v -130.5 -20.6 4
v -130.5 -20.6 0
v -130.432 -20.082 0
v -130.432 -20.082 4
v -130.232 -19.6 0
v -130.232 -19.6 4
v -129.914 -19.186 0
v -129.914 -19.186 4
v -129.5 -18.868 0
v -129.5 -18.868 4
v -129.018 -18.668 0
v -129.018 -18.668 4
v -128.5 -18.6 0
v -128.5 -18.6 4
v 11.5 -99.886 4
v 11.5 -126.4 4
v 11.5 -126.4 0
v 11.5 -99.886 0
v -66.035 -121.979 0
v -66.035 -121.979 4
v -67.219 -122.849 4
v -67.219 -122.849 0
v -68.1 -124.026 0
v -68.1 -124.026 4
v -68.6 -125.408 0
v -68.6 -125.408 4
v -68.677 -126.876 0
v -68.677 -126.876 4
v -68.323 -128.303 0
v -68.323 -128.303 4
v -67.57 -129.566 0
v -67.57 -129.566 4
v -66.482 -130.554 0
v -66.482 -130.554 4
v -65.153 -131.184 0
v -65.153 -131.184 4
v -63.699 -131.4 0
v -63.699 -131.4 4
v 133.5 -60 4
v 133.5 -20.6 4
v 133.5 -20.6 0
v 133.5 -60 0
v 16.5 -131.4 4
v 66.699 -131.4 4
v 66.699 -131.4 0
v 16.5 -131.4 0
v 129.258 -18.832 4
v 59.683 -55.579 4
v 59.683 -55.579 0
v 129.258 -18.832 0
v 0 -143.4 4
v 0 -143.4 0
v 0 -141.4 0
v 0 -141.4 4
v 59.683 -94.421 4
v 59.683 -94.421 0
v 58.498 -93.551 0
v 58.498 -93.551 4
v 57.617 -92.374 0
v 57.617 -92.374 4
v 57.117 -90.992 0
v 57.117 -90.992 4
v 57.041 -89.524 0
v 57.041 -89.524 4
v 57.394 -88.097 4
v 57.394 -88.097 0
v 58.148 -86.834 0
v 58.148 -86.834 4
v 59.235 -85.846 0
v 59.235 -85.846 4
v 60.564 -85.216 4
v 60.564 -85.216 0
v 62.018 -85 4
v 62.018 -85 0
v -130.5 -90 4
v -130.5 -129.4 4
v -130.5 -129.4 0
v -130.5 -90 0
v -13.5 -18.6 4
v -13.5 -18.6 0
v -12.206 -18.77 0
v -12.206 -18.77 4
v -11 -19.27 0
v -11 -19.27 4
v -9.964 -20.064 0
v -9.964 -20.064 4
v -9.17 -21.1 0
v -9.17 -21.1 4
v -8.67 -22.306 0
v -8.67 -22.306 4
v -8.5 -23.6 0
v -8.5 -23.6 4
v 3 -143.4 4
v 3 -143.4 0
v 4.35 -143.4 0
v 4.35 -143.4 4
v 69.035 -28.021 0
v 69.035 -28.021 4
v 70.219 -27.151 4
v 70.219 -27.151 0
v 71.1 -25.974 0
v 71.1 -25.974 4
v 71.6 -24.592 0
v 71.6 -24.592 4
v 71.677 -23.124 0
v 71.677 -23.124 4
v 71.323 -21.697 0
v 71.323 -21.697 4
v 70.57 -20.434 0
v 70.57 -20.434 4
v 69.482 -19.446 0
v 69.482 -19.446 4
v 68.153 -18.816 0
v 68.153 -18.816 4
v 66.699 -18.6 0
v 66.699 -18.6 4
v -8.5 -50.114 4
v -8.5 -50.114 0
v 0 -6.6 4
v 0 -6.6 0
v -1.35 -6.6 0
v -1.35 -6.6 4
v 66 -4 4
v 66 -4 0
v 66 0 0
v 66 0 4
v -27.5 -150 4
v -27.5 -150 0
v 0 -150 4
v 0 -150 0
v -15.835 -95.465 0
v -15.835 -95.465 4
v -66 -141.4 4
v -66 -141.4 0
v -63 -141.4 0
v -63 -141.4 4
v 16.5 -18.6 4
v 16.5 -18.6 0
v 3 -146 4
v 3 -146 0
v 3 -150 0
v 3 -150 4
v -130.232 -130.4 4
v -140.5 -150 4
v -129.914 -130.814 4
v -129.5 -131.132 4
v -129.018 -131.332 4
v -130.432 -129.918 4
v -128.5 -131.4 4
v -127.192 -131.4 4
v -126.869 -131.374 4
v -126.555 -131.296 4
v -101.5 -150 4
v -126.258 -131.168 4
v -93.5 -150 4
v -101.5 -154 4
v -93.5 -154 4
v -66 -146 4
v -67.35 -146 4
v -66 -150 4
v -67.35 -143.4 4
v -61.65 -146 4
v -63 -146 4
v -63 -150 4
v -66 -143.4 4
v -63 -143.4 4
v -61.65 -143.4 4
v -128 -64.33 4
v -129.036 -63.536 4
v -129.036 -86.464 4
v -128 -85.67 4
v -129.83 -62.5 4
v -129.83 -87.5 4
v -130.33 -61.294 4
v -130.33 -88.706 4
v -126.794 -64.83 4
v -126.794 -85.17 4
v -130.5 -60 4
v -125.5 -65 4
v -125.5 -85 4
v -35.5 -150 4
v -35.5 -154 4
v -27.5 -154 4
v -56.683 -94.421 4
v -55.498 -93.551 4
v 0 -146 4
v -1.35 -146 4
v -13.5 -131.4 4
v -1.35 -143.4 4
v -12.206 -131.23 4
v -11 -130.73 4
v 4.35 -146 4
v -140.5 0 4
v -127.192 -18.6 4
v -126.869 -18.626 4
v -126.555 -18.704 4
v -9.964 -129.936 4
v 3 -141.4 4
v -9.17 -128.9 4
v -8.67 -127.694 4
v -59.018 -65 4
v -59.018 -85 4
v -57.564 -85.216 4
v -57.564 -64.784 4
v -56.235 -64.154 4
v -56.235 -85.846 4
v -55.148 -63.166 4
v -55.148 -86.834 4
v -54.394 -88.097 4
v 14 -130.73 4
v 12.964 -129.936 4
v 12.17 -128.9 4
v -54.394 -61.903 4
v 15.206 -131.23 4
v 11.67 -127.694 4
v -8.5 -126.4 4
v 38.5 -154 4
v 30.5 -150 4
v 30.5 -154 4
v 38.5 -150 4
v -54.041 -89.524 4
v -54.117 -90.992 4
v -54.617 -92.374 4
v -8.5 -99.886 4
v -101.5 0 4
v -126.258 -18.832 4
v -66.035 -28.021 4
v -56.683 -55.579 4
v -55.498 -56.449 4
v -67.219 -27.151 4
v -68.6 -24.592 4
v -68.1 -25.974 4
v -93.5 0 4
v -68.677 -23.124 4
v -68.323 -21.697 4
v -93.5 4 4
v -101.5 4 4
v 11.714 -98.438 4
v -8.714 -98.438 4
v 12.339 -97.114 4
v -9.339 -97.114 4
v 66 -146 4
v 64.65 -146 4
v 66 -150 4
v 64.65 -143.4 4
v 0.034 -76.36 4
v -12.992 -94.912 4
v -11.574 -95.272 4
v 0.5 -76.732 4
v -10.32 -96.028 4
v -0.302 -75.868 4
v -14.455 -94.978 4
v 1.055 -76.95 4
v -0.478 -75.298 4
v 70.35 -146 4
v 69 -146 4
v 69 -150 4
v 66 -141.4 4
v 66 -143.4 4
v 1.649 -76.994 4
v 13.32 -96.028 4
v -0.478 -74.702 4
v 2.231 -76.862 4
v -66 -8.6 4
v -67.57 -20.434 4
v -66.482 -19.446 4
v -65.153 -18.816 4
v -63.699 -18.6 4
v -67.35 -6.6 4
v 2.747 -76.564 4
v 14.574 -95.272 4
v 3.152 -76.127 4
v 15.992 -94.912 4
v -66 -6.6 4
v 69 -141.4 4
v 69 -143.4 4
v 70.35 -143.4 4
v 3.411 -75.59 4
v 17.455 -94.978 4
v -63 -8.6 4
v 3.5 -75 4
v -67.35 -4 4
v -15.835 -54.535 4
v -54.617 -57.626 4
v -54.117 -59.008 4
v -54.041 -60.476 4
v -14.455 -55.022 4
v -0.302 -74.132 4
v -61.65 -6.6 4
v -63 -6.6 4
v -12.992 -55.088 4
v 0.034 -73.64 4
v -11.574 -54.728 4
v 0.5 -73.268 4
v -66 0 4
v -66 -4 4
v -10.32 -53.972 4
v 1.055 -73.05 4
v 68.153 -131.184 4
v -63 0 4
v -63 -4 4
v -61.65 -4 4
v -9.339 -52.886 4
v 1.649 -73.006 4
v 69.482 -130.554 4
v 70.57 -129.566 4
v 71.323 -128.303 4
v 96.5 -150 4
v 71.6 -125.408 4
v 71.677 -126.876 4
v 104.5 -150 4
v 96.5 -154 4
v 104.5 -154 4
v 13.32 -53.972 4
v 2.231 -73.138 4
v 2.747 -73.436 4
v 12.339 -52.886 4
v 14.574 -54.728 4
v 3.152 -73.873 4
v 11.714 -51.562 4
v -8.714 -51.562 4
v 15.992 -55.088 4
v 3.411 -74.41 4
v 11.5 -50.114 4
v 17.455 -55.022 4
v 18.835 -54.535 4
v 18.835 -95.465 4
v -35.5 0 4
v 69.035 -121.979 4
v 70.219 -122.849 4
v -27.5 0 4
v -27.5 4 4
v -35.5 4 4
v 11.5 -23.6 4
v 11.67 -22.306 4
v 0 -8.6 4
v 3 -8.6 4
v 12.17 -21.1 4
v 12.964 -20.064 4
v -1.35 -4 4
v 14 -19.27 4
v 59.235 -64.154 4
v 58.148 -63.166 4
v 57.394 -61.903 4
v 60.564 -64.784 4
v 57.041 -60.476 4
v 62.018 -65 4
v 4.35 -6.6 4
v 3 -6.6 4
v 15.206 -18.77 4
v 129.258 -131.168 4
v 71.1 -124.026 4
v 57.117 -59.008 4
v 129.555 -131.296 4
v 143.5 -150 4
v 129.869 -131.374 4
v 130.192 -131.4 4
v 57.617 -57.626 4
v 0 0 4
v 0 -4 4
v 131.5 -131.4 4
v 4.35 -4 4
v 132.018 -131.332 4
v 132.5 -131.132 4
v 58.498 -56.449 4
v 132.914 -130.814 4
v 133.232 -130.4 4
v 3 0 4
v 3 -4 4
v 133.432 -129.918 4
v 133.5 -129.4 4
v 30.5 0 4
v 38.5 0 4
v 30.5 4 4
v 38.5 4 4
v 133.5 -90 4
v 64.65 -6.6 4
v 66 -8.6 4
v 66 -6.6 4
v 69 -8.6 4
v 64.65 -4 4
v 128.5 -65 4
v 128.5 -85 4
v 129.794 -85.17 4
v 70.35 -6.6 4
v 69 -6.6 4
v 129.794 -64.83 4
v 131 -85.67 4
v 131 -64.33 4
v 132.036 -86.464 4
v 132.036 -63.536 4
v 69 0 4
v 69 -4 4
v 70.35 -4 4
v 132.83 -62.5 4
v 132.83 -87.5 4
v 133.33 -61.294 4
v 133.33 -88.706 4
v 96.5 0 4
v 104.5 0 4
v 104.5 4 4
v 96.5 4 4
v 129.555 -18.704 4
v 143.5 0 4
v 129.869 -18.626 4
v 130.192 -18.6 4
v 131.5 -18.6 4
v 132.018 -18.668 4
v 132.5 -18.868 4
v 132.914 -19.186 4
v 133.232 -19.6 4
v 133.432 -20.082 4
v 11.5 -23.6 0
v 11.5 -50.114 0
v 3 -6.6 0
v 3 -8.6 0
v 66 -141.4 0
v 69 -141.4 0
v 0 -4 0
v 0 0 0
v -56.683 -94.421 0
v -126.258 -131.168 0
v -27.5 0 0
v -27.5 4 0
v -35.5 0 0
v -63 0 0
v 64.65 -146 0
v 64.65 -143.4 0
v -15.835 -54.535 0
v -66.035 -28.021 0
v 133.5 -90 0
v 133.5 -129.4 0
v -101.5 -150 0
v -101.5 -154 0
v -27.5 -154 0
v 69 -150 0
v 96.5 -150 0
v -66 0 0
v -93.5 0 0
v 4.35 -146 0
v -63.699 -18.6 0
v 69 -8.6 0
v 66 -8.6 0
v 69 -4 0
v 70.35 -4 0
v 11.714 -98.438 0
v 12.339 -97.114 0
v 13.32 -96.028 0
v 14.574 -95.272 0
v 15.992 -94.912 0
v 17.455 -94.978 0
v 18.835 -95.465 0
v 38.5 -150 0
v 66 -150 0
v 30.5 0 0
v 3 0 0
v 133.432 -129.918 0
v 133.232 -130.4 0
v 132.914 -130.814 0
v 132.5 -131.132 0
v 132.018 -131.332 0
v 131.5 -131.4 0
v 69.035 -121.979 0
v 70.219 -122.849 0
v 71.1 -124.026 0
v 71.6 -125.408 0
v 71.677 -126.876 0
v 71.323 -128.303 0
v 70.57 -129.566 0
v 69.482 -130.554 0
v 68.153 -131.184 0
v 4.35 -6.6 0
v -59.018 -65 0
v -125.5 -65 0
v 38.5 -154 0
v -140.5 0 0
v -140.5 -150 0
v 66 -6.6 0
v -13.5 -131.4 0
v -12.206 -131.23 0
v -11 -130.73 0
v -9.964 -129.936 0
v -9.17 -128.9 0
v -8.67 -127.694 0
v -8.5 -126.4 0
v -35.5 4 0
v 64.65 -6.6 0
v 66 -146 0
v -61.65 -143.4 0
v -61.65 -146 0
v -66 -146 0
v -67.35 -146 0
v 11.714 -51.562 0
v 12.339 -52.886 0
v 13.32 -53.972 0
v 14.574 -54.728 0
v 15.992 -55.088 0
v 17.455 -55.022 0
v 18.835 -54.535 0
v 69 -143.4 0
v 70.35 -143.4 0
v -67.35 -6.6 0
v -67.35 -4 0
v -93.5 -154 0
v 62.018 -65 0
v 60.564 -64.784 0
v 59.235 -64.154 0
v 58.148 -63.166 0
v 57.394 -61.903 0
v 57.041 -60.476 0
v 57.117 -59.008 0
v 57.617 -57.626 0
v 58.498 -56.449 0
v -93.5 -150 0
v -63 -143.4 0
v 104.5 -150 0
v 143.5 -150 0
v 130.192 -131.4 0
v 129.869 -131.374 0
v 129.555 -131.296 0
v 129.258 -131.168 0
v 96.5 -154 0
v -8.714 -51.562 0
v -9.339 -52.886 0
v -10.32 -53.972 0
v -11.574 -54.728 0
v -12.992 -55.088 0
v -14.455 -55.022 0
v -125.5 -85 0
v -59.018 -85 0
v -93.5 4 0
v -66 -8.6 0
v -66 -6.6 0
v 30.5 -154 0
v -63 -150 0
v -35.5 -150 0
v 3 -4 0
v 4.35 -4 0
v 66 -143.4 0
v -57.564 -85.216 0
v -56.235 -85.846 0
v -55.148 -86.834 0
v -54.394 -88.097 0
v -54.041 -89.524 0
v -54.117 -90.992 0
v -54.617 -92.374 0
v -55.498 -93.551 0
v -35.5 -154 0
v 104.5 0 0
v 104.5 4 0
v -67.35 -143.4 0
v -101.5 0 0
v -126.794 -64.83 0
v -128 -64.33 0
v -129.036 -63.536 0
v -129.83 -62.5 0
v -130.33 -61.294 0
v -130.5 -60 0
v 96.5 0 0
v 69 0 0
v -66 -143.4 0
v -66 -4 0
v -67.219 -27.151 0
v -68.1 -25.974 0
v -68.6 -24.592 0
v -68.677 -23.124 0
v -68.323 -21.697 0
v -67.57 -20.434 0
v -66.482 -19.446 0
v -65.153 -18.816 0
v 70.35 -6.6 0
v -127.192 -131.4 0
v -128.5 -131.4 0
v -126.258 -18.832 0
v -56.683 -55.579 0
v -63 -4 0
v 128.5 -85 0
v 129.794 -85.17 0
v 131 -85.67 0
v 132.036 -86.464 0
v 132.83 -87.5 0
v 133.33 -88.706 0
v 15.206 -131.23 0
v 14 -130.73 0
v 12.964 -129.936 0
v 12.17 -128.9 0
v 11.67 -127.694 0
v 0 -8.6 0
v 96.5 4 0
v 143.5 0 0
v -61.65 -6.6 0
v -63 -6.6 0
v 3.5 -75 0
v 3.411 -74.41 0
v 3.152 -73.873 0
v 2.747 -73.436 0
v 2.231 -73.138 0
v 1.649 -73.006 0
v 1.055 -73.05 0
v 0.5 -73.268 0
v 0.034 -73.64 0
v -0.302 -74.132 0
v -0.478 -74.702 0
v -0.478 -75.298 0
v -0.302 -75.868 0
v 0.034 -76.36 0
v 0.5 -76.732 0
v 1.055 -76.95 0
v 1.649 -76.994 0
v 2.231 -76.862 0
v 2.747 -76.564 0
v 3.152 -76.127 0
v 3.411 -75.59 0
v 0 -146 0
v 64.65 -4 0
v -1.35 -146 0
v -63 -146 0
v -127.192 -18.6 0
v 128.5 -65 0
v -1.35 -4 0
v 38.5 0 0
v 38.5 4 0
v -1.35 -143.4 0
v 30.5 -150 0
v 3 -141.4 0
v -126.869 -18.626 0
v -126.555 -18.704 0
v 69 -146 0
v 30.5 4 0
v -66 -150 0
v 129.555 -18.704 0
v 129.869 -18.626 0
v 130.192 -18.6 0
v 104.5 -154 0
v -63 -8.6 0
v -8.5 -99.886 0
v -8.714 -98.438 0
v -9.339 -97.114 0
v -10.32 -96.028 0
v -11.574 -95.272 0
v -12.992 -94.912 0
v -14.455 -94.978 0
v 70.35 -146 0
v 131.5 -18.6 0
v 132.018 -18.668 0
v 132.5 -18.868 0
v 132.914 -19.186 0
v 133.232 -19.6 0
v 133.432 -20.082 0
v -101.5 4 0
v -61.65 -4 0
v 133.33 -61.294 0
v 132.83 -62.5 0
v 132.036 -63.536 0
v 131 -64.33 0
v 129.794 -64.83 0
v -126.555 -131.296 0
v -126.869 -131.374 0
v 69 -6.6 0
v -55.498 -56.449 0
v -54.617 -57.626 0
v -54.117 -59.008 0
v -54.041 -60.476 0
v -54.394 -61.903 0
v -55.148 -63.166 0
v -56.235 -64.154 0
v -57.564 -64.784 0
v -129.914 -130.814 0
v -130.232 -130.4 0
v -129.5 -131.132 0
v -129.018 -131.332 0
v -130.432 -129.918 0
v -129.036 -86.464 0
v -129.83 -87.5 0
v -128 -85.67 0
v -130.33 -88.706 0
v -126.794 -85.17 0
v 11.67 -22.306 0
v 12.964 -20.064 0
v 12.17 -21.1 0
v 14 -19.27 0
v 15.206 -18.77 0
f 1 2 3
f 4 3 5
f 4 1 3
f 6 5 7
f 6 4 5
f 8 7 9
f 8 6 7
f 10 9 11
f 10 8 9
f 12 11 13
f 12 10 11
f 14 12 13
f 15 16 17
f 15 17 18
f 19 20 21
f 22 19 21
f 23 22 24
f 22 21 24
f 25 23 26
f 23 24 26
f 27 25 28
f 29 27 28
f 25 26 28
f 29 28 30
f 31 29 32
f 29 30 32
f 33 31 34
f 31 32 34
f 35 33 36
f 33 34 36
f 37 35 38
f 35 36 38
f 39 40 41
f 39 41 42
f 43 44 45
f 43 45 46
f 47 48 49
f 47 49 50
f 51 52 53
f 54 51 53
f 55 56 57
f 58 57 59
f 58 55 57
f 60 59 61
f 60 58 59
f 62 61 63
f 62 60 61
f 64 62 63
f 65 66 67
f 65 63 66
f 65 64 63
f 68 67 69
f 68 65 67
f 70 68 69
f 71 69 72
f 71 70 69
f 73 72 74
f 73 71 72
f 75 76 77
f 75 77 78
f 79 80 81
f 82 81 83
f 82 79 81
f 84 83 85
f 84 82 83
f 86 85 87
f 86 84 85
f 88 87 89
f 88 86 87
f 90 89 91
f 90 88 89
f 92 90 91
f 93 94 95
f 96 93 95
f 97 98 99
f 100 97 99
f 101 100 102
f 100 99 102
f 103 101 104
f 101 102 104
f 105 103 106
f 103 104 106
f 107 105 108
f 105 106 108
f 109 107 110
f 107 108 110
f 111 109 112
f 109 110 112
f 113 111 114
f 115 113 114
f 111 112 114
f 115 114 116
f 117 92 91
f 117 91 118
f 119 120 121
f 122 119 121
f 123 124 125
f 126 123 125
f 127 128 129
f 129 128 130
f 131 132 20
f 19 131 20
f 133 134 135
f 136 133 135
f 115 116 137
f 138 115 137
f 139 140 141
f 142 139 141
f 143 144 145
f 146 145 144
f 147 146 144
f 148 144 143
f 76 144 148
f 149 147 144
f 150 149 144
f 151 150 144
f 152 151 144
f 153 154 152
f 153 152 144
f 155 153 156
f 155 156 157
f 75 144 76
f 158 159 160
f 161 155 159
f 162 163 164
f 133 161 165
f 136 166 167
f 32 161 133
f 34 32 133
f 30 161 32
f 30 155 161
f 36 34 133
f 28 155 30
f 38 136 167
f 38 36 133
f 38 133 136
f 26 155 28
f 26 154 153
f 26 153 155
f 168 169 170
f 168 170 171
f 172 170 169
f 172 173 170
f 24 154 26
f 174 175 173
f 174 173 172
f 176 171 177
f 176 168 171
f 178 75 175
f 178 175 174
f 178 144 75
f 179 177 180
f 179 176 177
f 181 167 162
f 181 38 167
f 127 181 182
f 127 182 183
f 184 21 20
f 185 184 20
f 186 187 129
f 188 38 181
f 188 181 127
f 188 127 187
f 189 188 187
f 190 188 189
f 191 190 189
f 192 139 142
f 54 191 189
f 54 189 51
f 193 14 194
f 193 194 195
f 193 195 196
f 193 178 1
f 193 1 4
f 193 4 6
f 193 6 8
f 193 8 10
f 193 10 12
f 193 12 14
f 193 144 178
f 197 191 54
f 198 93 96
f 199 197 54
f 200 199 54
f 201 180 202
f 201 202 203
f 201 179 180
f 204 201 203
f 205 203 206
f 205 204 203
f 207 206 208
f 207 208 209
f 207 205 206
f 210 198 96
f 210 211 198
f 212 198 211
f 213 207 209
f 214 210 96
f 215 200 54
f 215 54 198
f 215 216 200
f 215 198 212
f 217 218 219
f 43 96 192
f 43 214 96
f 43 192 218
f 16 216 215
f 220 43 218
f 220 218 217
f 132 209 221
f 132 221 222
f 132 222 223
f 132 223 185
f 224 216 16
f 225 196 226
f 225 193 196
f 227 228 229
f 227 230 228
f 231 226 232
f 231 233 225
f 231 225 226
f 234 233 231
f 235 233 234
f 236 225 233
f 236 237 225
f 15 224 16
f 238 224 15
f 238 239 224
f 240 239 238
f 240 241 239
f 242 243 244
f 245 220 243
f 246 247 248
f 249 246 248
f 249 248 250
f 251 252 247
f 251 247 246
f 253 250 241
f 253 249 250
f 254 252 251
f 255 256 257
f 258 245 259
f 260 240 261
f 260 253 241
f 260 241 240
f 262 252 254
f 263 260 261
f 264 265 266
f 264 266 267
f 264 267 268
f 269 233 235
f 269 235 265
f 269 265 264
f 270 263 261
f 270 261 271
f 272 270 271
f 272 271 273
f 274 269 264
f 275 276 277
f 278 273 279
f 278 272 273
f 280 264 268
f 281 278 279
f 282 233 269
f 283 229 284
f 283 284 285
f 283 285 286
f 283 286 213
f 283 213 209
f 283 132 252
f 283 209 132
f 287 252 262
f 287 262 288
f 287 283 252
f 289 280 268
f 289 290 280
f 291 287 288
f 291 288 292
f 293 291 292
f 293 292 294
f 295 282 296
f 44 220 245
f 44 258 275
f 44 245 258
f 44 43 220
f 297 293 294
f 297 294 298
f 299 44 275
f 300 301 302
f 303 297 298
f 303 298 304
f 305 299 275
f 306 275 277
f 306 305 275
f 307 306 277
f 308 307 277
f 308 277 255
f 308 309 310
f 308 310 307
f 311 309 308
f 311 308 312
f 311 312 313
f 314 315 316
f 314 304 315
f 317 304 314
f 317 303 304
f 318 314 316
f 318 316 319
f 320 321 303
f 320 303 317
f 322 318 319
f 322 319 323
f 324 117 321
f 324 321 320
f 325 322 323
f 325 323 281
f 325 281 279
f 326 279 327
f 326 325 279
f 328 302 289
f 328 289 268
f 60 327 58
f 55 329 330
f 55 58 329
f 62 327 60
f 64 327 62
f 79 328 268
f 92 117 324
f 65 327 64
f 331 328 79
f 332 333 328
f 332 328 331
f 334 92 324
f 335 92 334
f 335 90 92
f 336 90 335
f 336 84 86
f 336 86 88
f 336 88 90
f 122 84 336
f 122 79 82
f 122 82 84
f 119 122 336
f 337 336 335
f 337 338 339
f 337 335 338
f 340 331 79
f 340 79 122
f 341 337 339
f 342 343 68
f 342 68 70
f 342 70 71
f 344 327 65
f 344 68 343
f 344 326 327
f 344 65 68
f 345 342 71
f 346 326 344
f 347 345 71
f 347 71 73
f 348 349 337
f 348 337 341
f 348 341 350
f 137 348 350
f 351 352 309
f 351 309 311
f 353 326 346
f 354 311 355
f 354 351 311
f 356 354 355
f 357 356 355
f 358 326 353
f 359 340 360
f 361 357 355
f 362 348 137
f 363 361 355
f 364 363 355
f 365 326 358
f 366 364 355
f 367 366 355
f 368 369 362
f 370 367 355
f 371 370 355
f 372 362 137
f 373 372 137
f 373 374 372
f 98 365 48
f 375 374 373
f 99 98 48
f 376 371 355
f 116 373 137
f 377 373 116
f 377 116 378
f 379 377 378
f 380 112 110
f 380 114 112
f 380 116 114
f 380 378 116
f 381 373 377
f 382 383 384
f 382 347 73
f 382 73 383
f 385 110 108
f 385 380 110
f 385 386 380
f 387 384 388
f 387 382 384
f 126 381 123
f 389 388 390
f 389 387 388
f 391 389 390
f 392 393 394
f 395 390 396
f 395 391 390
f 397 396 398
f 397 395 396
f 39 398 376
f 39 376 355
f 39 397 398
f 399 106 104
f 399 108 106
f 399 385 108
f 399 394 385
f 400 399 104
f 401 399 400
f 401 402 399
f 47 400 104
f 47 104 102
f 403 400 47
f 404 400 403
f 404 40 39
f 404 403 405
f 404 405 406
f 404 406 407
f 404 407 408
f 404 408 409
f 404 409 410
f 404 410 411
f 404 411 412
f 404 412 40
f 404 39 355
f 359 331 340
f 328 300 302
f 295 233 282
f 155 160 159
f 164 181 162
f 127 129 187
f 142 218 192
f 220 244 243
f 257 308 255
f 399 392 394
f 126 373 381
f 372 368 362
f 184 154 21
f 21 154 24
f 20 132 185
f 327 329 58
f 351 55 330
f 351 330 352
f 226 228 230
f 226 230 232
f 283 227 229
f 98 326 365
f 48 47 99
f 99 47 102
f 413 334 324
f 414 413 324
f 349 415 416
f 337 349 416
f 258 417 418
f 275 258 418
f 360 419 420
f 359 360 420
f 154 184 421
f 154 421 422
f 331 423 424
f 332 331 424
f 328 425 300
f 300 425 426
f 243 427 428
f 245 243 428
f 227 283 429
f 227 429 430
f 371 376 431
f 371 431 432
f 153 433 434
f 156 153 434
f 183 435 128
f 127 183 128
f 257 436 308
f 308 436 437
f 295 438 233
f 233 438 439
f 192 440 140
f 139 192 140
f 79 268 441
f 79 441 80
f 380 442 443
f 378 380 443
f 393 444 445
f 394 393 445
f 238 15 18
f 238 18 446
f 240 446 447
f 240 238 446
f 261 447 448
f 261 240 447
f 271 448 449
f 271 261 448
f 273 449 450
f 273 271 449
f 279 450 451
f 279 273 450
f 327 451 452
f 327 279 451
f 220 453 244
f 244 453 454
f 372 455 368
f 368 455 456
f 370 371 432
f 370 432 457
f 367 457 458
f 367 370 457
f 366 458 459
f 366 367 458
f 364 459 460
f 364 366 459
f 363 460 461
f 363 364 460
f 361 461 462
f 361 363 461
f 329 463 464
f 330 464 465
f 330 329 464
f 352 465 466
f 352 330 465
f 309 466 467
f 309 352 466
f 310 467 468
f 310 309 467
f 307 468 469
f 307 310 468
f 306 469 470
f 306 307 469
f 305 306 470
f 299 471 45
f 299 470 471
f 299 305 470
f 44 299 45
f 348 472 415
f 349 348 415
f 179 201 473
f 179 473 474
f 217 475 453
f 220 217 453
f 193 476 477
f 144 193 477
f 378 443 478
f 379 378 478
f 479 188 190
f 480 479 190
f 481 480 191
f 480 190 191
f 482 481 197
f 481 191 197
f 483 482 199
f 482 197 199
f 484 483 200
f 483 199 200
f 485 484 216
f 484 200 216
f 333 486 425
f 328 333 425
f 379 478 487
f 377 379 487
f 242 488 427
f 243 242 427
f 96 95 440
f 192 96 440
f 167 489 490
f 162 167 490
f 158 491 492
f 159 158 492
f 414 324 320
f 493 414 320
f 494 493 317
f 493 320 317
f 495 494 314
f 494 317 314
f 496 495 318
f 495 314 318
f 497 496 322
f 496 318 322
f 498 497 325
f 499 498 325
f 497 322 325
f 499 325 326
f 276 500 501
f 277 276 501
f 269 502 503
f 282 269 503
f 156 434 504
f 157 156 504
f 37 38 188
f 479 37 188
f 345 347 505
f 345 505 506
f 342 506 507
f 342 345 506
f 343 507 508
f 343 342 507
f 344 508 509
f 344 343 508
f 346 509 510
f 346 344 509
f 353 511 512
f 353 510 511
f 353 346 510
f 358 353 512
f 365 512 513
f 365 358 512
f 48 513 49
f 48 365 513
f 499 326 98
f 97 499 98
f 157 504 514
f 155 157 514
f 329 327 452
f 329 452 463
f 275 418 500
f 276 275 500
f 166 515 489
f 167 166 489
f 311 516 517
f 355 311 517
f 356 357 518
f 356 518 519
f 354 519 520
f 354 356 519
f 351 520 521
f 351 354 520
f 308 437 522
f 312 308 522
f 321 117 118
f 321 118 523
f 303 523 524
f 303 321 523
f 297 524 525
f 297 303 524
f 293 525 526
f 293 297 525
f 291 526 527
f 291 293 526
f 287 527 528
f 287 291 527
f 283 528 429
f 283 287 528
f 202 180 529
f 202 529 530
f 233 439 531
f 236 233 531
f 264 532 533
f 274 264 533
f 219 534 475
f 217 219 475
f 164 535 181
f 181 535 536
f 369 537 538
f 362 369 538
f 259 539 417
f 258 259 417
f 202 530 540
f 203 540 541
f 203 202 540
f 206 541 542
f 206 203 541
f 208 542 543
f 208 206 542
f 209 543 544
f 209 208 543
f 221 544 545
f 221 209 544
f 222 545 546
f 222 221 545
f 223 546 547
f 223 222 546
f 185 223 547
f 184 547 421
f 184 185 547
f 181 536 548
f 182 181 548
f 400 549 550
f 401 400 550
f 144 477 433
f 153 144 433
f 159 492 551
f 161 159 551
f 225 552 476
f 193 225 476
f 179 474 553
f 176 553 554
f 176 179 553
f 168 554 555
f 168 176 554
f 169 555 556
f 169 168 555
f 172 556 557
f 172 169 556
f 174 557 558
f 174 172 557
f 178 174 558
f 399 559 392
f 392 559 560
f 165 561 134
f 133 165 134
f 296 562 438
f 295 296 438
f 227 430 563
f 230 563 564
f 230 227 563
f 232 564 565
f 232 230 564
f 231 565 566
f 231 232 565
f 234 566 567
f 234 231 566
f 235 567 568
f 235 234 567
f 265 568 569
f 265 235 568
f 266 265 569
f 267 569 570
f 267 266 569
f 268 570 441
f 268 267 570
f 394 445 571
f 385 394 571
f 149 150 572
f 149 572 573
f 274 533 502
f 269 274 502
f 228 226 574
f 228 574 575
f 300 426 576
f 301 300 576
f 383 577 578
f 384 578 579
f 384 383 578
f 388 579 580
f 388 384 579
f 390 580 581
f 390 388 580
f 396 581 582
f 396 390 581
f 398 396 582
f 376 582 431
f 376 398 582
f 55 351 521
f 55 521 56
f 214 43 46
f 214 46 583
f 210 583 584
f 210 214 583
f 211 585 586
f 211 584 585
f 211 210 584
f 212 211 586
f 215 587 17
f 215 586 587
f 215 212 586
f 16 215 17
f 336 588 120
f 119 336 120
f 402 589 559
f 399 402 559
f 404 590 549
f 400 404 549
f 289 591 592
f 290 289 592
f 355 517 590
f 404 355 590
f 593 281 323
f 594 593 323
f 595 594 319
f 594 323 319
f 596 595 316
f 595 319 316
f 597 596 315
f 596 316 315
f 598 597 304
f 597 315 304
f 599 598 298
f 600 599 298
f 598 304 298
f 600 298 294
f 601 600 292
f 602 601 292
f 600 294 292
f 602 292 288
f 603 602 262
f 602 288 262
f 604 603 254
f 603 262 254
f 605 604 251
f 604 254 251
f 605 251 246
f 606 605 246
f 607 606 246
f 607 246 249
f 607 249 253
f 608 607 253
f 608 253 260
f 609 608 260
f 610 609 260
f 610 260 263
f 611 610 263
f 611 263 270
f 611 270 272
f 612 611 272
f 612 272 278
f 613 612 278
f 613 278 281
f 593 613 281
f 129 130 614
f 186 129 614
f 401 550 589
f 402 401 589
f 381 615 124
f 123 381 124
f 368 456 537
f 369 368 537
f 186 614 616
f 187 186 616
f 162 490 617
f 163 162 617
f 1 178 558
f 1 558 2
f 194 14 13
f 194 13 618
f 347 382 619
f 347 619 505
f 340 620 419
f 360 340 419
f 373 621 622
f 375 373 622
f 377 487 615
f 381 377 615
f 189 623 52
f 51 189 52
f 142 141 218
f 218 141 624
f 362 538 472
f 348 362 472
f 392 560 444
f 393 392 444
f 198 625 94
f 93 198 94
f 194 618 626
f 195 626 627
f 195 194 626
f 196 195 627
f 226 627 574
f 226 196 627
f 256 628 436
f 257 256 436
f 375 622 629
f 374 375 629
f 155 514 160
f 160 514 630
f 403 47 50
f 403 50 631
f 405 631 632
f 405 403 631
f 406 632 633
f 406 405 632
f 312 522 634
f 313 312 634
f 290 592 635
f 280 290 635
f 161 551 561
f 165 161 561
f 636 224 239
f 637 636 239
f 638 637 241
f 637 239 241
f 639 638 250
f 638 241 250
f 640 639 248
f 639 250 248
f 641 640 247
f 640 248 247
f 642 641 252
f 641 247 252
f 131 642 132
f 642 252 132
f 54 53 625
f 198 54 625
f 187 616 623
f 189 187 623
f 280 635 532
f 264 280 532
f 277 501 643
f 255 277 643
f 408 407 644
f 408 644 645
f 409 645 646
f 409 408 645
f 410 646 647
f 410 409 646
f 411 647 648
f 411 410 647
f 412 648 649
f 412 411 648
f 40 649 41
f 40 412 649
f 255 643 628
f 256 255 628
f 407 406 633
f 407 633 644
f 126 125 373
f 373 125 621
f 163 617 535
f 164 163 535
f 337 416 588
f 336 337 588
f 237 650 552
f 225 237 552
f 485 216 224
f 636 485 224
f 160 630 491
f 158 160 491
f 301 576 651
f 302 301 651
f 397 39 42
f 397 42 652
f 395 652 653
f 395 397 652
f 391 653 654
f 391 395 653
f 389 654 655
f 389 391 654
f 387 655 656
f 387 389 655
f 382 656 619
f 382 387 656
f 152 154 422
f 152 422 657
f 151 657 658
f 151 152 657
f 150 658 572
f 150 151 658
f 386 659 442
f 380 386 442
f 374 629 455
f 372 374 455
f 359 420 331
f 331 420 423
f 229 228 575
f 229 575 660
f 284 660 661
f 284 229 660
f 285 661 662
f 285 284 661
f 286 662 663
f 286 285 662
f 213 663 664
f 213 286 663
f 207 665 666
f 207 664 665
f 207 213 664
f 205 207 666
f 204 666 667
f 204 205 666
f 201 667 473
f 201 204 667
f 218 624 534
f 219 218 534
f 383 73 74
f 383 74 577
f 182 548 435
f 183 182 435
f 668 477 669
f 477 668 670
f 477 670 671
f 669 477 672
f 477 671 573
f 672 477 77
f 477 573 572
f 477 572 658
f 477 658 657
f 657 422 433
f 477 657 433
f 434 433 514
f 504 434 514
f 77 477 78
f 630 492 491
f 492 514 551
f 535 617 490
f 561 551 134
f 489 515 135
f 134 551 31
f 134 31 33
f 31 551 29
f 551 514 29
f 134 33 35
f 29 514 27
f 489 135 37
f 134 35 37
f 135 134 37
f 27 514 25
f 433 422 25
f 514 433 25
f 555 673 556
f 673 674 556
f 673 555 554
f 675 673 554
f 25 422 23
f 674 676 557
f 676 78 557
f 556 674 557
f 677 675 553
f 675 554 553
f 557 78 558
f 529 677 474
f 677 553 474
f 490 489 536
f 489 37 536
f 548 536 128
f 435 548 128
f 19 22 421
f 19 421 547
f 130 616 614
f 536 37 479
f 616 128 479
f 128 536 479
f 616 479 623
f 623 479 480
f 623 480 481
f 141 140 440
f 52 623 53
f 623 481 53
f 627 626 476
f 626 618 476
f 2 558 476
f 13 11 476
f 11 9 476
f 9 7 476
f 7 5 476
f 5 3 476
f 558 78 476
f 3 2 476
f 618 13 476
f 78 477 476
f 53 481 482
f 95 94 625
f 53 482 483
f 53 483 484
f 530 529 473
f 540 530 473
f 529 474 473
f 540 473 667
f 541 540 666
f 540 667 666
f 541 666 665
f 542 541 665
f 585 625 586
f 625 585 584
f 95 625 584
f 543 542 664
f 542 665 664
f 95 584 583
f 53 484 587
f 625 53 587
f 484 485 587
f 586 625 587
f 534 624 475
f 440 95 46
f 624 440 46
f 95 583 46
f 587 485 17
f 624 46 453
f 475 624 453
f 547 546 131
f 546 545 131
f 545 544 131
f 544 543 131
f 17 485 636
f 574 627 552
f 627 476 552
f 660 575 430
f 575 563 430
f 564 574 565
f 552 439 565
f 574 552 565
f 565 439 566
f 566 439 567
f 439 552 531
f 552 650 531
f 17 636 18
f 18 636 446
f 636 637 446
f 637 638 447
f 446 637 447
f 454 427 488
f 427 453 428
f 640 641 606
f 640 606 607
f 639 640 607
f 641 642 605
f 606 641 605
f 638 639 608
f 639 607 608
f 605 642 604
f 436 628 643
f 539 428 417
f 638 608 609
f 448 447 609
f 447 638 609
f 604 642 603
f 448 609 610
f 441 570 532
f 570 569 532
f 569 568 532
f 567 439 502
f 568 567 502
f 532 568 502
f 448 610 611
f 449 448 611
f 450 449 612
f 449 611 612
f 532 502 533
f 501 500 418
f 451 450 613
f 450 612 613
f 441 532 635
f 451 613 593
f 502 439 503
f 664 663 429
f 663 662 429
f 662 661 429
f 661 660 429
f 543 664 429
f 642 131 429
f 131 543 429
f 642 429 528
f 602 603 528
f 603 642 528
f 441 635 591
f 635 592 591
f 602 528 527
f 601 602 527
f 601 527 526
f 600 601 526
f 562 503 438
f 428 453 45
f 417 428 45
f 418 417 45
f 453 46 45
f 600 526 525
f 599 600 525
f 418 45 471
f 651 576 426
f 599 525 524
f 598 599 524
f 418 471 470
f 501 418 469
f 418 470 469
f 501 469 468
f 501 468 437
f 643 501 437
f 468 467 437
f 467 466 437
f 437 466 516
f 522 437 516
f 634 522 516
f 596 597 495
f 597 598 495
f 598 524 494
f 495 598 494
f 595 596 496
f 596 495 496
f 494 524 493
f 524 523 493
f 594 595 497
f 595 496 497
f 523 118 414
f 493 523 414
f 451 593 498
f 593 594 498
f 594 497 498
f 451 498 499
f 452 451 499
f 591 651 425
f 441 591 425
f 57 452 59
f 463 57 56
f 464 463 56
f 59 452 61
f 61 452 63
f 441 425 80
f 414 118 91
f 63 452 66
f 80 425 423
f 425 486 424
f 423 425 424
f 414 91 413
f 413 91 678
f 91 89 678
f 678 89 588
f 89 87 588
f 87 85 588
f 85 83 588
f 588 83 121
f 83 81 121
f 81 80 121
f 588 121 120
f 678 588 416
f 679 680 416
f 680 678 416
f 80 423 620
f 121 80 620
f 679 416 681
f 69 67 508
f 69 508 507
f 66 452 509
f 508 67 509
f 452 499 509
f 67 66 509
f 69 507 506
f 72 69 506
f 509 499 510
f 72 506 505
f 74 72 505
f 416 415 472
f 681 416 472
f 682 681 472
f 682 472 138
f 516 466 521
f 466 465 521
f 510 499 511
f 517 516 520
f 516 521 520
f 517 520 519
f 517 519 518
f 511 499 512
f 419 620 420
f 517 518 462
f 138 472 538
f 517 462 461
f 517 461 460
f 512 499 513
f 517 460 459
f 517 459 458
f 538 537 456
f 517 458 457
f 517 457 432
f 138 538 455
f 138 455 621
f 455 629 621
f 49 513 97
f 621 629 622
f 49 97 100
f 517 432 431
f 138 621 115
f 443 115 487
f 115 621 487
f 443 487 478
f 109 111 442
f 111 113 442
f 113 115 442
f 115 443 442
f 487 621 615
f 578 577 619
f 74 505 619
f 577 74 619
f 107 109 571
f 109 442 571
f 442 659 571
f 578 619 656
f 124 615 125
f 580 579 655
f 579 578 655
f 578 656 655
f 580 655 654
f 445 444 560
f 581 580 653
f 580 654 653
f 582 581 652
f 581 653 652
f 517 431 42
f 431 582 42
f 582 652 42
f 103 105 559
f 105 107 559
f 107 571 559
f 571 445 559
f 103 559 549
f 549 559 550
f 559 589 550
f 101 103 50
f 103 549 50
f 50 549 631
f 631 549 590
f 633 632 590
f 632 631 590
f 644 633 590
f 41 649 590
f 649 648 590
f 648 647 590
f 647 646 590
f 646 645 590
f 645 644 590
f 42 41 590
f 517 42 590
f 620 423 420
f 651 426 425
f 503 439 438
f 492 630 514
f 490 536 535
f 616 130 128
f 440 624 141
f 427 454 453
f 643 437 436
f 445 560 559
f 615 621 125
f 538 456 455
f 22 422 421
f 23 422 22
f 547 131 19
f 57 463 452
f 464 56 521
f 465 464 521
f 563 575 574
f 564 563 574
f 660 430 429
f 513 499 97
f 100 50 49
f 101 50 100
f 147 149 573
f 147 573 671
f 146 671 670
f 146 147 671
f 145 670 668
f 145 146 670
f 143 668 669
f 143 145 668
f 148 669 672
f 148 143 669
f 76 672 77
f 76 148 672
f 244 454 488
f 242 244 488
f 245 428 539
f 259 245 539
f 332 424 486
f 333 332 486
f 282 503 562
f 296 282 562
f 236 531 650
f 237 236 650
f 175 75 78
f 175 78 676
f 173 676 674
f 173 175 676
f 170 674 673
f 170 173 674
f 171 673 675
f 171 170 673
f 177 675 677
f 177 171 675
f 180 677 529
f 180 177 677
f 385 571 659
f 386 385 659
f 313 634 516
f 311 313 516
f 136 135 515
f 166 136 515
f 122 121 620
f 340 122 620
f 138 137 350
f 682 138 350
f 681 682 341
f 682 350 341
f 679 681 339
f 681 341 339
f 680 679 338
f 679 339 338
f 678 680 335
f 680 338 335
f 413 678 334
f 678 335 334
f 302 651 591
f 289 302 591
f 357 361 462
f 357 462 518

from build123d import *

# Parameters (mm, degrees)
EXTRUDE_1_DEPTH     = 4
SKETCH_4_R          = 2
CUT_EXTRUDE_1_DEPTH = 10


with BuildPart() as part:
    # 草图1 → 凸台-拉伸1 (new body)
    with BuildSketch(Plane.XY):
        Polygon((0, -4), (0, 0), (-27.5, 0), (-27.5, 4), (-35.5, 4), (-35.5, 0), (-63, 0), (-63, -4), (-61.65, -4), (-61.65, -6.6), (-63, -6.6), (-63, -8.6), (-66, -8.6), (-66, -6.6), (-67.35, -6.6), (-67.35, -4), (-66, -4), (-66, 0), (-93.5, 0), (-93.5, 4), (-101.5, 4), (-101.5, 0), (-129, 0), (-140.5, 0), (-140.5, -150), (-129, -150), (-101.5, -150), (-101.5, -154), (-93.5, -154), (-93.5, -150), (-66, -150), (-66, -146), (-67.35, -146), (-67.35, -143.4), (-66, -143.4), (-66, -141.4), (-63, -141.4), (-63, -143.4), (-61.65, -143.4), (-61.65, -146), (-63, -146), (-63, -150), (-35.5, -150), (-35.5, -154), (-27.5, -154), (-27.5, -150), (0, -150), (0, -146), (-1.35, -146), (-1.35, -143.4), (0, -143.4), (0, -141.4), (3, -141.4), (3, -143.4), (4.35, -143.4), (4.35, -146), (3, -146), (3, -150), (30.5, -150), (30.5, -154), (38.5, -154), (38.5, -150), (66, -150), (66, -146), (64.65, -146), (64.65, -143.4), (66, -143.4), (66, -141.4), (69, -141.4), (69, -143.4), (70.35, -143.4), (70.35, -146), (69, -146), (69, -150), (96.5, -150), (96.5, -154), (104.5, -154), (104.5, -150), (132, -150), (143.5, -150), (143.5, 0), (132, 0), (104.5, 0), (104.5, 4), (96.5, 4), (96.5, 0), (69, 0), (69, -4), (70.35, -4), (70.35, -6.6), (69, -6.6), (69, -8.6), (66, -8.6), (66, -6.6), (64.65, -6.6), (64.65, -4), (66, -4), (66, 0), (38.5, 0), (38.5, 4), (30.5, 4), (30.5, 0), (3, 0), (3, -4), (4.35, -4), (4.35, -6.6), (3, -6.6), (3, -8.6), (0, -8.6), (0, -6.6), (-1.35, -6.6), (-1.35, -4), align=None)
    extrude(amount=EXTRUDE_1_DEPTH)

    # 草图4 → 切除-拉伸1 (cut)
    with BuildSketch(Plane.XY.offset(4)):
        with BuildLine():
            ThreePointArc((-127.191659555, -18.6), (-126.710498265, -18.658741693), (-126.257601204, -18.831516187))
            Line((-126.257601204, -18.831516187), (-56.682761898, -55.578790468))
            ThreePointArc((-56.682761898, -55.578790468), (-54.164762011, -61.202903226), (-59.017907777, -65))
            Line((-59.017907777, -65), (-125.5, -65))
            ThreePointArc((-125.5, -65), (-129.035533906, -63.535533906), (-130.5, -60))
            Line((-130.5, -60), (-130.5, -20.6))
            ThreePointArc((-130.5, -20.6), (-129.914213562, -19.185786438), (-128.5, -18.6))
            Line((-128.5, -18.6), (-127.191659555, -18.6))
        make_face()
        with BuildLine():
            ThreePointArc((-130.5, -90), (-129.035533906, -86.464466094), (-125.5, -85))
            Line((-125.5, -85), (-59.017907777, -85))
            ThreePointArc((-59.017907777, -85), (-54.164762011, -88.797096774), (-56.682761898, -94.421209532))
            Line((-56.682761898, -94.421209532), (-126.257601204, -131.168483813))
            ThreePointArc((-126.257601204, -131.168483813), (-126.710498265, -131.341258307), (-127.191659555, -131.4))
            Line((-127.191659555, -131.4), (-128.5, -131.4))
            ThreePointArc((-128.5, -131.4), (-129.914213562, -130.814213562), (-130.5, -129.4))
            Line((-130.5, -129.4), (-130.5, -90))
        make_face()
        with BuildLine():
            Line((-15.835145879, -95.465009365), (-66.034571435, -121.978790468))
            ThreePointArc((-66.034571435, -121.978790468), (-68.552571322, -127.602903226), (-63.699425556, -131.4))
            Line((-63.699425556, -131.4), (-13.5, -131.4))
            ThreePointArc((-13.5, -131.4), (-9.964466094, -129.935533906), (-8.5, -126.4))
            Line((-8.5, -126.4), (-8.5, -99.886218897))
            ThreePointArc((-8.5, -99.886218897), (-10.918888747, -95.603945587), (-15.835145879, -95.465009365))
        make_face()
        with BuildLine():
            Line((18.835145879, -95.465009365), (69.034571435, -121.978790468))
            ThreePointArc((69.034571435, -121.978790468), (71.552571322, -127.602903226), (66.699425556, -131.4))
            Line((66.699425556, -131.4), (16.5, -131.4))
            ThreePointArc((16.5, -131.4), (12.964466094, -129.935533906), (11.5, -126.4))
            Line((11.5, -126.4), (11.5, -99.886218897))
            ThreePointArc((11.5, -99.886218897), (13.918888747, -95.603945587), (18.835145879, -95.465009365))
        make_face()
        with BuildLine():
            ThreePointArc((130.191659555, -131.4), (129.710498265, -131.341258307), (129.257601204, -131.168483813))
            Line((129.257601204, -131.168483813), (59.682761898, -94.421209532))
            ThreePointArc((59.682761898, -94.421209532), (57.164762011, -88.797096774), (62.017907777, -85))
            Line((62.017907777, -85), (128.5, -85))
            ThreePointArc((128.5, -85), (132.035533906, -86.464466094), (133.5, -90))
            Line((133.5, -90), (133.5, -129.4))
            ThreePointArc((133.5, -129.4), (132.914213562, -130.814213562), (131.5, -131.4))
            Line((131.5, -131.4), (130.191659555, -131.4))
        make_face()
        with BuildLine():
            ThreePointArc((133.5, -60), (132.035533906, -63.535533906), (128.5, -65))
            Line((128.5, -65), (62.017907777, -65))
            ThreePointArc((62.017907777, -65), (57.164762011, -61.202903226), (59.682761898, -55.578790468))
            Line((59.682761898, -55.578790468), (129.257601204, -18.831516187))
            ThreePointArc((129.257601204, -18.831516187), (129.710498265, -18.658741693), (130.191659555, -18.6))
            Line((130.191659555, -18.6), (131.5, -18.6))
            ThreePointArc((131.5, -18.6), (132.914213562, -19.185786438), (133.5, -20.6))
            Line((133.5, -20.6), (133.5, -60))
        make_face()
        with BuildLine():
            Line((18.835145879, -54.534990635), (69.034571435, -28.021209532))
            ThreePointArc((69.034571435, -28.021209532), (71.552571322, -22.397096774), (66.699425556, -18.6))
            Line((66.699425556, -18.6), (16.5, -18.6))
            ThreePointArc((16.5, -18.6), (12.964466094, -20.064466094), (11.5, -23.6))
            Line((11.5, -23.6), (11.5, -50.113781103))
            ThreePointArc((11.5, -50.113781103), (13.918888747, -54.396054413), (18.835145879, -54.534990635))
        make_face()
        with BuildLine():
            Line((-15.835145879, -54.534990635), (-66.034571435, -28.021209532))
            ThreePointArc((-66.034571435, -28.021209532), (-68.552571322, -22.397096774), (-63.699425556, -18.6))
            Line((-63.699425556, -18.6), (-13.5, -18.6))
            ThreePointArc((-13.5, -18.6), (-9.964466094, -20.064466094), (-8.5, -23.6))
            Line((-8.5, -23.6), (-8.5, -50.113781103))
            ThreePointArc((-8.5, -50.113781103), (-10.918888747, -54.396054413), (-15.835145879, -54.534990635))
        make_face()
        with Locations((1.5, -75)):
            Circle(SKETCH_4_R)
    extrude(amount=-CUT_EXTRUDE_1_DEPTH, mode=Mode.SUBTRACT)


solid = part.part
